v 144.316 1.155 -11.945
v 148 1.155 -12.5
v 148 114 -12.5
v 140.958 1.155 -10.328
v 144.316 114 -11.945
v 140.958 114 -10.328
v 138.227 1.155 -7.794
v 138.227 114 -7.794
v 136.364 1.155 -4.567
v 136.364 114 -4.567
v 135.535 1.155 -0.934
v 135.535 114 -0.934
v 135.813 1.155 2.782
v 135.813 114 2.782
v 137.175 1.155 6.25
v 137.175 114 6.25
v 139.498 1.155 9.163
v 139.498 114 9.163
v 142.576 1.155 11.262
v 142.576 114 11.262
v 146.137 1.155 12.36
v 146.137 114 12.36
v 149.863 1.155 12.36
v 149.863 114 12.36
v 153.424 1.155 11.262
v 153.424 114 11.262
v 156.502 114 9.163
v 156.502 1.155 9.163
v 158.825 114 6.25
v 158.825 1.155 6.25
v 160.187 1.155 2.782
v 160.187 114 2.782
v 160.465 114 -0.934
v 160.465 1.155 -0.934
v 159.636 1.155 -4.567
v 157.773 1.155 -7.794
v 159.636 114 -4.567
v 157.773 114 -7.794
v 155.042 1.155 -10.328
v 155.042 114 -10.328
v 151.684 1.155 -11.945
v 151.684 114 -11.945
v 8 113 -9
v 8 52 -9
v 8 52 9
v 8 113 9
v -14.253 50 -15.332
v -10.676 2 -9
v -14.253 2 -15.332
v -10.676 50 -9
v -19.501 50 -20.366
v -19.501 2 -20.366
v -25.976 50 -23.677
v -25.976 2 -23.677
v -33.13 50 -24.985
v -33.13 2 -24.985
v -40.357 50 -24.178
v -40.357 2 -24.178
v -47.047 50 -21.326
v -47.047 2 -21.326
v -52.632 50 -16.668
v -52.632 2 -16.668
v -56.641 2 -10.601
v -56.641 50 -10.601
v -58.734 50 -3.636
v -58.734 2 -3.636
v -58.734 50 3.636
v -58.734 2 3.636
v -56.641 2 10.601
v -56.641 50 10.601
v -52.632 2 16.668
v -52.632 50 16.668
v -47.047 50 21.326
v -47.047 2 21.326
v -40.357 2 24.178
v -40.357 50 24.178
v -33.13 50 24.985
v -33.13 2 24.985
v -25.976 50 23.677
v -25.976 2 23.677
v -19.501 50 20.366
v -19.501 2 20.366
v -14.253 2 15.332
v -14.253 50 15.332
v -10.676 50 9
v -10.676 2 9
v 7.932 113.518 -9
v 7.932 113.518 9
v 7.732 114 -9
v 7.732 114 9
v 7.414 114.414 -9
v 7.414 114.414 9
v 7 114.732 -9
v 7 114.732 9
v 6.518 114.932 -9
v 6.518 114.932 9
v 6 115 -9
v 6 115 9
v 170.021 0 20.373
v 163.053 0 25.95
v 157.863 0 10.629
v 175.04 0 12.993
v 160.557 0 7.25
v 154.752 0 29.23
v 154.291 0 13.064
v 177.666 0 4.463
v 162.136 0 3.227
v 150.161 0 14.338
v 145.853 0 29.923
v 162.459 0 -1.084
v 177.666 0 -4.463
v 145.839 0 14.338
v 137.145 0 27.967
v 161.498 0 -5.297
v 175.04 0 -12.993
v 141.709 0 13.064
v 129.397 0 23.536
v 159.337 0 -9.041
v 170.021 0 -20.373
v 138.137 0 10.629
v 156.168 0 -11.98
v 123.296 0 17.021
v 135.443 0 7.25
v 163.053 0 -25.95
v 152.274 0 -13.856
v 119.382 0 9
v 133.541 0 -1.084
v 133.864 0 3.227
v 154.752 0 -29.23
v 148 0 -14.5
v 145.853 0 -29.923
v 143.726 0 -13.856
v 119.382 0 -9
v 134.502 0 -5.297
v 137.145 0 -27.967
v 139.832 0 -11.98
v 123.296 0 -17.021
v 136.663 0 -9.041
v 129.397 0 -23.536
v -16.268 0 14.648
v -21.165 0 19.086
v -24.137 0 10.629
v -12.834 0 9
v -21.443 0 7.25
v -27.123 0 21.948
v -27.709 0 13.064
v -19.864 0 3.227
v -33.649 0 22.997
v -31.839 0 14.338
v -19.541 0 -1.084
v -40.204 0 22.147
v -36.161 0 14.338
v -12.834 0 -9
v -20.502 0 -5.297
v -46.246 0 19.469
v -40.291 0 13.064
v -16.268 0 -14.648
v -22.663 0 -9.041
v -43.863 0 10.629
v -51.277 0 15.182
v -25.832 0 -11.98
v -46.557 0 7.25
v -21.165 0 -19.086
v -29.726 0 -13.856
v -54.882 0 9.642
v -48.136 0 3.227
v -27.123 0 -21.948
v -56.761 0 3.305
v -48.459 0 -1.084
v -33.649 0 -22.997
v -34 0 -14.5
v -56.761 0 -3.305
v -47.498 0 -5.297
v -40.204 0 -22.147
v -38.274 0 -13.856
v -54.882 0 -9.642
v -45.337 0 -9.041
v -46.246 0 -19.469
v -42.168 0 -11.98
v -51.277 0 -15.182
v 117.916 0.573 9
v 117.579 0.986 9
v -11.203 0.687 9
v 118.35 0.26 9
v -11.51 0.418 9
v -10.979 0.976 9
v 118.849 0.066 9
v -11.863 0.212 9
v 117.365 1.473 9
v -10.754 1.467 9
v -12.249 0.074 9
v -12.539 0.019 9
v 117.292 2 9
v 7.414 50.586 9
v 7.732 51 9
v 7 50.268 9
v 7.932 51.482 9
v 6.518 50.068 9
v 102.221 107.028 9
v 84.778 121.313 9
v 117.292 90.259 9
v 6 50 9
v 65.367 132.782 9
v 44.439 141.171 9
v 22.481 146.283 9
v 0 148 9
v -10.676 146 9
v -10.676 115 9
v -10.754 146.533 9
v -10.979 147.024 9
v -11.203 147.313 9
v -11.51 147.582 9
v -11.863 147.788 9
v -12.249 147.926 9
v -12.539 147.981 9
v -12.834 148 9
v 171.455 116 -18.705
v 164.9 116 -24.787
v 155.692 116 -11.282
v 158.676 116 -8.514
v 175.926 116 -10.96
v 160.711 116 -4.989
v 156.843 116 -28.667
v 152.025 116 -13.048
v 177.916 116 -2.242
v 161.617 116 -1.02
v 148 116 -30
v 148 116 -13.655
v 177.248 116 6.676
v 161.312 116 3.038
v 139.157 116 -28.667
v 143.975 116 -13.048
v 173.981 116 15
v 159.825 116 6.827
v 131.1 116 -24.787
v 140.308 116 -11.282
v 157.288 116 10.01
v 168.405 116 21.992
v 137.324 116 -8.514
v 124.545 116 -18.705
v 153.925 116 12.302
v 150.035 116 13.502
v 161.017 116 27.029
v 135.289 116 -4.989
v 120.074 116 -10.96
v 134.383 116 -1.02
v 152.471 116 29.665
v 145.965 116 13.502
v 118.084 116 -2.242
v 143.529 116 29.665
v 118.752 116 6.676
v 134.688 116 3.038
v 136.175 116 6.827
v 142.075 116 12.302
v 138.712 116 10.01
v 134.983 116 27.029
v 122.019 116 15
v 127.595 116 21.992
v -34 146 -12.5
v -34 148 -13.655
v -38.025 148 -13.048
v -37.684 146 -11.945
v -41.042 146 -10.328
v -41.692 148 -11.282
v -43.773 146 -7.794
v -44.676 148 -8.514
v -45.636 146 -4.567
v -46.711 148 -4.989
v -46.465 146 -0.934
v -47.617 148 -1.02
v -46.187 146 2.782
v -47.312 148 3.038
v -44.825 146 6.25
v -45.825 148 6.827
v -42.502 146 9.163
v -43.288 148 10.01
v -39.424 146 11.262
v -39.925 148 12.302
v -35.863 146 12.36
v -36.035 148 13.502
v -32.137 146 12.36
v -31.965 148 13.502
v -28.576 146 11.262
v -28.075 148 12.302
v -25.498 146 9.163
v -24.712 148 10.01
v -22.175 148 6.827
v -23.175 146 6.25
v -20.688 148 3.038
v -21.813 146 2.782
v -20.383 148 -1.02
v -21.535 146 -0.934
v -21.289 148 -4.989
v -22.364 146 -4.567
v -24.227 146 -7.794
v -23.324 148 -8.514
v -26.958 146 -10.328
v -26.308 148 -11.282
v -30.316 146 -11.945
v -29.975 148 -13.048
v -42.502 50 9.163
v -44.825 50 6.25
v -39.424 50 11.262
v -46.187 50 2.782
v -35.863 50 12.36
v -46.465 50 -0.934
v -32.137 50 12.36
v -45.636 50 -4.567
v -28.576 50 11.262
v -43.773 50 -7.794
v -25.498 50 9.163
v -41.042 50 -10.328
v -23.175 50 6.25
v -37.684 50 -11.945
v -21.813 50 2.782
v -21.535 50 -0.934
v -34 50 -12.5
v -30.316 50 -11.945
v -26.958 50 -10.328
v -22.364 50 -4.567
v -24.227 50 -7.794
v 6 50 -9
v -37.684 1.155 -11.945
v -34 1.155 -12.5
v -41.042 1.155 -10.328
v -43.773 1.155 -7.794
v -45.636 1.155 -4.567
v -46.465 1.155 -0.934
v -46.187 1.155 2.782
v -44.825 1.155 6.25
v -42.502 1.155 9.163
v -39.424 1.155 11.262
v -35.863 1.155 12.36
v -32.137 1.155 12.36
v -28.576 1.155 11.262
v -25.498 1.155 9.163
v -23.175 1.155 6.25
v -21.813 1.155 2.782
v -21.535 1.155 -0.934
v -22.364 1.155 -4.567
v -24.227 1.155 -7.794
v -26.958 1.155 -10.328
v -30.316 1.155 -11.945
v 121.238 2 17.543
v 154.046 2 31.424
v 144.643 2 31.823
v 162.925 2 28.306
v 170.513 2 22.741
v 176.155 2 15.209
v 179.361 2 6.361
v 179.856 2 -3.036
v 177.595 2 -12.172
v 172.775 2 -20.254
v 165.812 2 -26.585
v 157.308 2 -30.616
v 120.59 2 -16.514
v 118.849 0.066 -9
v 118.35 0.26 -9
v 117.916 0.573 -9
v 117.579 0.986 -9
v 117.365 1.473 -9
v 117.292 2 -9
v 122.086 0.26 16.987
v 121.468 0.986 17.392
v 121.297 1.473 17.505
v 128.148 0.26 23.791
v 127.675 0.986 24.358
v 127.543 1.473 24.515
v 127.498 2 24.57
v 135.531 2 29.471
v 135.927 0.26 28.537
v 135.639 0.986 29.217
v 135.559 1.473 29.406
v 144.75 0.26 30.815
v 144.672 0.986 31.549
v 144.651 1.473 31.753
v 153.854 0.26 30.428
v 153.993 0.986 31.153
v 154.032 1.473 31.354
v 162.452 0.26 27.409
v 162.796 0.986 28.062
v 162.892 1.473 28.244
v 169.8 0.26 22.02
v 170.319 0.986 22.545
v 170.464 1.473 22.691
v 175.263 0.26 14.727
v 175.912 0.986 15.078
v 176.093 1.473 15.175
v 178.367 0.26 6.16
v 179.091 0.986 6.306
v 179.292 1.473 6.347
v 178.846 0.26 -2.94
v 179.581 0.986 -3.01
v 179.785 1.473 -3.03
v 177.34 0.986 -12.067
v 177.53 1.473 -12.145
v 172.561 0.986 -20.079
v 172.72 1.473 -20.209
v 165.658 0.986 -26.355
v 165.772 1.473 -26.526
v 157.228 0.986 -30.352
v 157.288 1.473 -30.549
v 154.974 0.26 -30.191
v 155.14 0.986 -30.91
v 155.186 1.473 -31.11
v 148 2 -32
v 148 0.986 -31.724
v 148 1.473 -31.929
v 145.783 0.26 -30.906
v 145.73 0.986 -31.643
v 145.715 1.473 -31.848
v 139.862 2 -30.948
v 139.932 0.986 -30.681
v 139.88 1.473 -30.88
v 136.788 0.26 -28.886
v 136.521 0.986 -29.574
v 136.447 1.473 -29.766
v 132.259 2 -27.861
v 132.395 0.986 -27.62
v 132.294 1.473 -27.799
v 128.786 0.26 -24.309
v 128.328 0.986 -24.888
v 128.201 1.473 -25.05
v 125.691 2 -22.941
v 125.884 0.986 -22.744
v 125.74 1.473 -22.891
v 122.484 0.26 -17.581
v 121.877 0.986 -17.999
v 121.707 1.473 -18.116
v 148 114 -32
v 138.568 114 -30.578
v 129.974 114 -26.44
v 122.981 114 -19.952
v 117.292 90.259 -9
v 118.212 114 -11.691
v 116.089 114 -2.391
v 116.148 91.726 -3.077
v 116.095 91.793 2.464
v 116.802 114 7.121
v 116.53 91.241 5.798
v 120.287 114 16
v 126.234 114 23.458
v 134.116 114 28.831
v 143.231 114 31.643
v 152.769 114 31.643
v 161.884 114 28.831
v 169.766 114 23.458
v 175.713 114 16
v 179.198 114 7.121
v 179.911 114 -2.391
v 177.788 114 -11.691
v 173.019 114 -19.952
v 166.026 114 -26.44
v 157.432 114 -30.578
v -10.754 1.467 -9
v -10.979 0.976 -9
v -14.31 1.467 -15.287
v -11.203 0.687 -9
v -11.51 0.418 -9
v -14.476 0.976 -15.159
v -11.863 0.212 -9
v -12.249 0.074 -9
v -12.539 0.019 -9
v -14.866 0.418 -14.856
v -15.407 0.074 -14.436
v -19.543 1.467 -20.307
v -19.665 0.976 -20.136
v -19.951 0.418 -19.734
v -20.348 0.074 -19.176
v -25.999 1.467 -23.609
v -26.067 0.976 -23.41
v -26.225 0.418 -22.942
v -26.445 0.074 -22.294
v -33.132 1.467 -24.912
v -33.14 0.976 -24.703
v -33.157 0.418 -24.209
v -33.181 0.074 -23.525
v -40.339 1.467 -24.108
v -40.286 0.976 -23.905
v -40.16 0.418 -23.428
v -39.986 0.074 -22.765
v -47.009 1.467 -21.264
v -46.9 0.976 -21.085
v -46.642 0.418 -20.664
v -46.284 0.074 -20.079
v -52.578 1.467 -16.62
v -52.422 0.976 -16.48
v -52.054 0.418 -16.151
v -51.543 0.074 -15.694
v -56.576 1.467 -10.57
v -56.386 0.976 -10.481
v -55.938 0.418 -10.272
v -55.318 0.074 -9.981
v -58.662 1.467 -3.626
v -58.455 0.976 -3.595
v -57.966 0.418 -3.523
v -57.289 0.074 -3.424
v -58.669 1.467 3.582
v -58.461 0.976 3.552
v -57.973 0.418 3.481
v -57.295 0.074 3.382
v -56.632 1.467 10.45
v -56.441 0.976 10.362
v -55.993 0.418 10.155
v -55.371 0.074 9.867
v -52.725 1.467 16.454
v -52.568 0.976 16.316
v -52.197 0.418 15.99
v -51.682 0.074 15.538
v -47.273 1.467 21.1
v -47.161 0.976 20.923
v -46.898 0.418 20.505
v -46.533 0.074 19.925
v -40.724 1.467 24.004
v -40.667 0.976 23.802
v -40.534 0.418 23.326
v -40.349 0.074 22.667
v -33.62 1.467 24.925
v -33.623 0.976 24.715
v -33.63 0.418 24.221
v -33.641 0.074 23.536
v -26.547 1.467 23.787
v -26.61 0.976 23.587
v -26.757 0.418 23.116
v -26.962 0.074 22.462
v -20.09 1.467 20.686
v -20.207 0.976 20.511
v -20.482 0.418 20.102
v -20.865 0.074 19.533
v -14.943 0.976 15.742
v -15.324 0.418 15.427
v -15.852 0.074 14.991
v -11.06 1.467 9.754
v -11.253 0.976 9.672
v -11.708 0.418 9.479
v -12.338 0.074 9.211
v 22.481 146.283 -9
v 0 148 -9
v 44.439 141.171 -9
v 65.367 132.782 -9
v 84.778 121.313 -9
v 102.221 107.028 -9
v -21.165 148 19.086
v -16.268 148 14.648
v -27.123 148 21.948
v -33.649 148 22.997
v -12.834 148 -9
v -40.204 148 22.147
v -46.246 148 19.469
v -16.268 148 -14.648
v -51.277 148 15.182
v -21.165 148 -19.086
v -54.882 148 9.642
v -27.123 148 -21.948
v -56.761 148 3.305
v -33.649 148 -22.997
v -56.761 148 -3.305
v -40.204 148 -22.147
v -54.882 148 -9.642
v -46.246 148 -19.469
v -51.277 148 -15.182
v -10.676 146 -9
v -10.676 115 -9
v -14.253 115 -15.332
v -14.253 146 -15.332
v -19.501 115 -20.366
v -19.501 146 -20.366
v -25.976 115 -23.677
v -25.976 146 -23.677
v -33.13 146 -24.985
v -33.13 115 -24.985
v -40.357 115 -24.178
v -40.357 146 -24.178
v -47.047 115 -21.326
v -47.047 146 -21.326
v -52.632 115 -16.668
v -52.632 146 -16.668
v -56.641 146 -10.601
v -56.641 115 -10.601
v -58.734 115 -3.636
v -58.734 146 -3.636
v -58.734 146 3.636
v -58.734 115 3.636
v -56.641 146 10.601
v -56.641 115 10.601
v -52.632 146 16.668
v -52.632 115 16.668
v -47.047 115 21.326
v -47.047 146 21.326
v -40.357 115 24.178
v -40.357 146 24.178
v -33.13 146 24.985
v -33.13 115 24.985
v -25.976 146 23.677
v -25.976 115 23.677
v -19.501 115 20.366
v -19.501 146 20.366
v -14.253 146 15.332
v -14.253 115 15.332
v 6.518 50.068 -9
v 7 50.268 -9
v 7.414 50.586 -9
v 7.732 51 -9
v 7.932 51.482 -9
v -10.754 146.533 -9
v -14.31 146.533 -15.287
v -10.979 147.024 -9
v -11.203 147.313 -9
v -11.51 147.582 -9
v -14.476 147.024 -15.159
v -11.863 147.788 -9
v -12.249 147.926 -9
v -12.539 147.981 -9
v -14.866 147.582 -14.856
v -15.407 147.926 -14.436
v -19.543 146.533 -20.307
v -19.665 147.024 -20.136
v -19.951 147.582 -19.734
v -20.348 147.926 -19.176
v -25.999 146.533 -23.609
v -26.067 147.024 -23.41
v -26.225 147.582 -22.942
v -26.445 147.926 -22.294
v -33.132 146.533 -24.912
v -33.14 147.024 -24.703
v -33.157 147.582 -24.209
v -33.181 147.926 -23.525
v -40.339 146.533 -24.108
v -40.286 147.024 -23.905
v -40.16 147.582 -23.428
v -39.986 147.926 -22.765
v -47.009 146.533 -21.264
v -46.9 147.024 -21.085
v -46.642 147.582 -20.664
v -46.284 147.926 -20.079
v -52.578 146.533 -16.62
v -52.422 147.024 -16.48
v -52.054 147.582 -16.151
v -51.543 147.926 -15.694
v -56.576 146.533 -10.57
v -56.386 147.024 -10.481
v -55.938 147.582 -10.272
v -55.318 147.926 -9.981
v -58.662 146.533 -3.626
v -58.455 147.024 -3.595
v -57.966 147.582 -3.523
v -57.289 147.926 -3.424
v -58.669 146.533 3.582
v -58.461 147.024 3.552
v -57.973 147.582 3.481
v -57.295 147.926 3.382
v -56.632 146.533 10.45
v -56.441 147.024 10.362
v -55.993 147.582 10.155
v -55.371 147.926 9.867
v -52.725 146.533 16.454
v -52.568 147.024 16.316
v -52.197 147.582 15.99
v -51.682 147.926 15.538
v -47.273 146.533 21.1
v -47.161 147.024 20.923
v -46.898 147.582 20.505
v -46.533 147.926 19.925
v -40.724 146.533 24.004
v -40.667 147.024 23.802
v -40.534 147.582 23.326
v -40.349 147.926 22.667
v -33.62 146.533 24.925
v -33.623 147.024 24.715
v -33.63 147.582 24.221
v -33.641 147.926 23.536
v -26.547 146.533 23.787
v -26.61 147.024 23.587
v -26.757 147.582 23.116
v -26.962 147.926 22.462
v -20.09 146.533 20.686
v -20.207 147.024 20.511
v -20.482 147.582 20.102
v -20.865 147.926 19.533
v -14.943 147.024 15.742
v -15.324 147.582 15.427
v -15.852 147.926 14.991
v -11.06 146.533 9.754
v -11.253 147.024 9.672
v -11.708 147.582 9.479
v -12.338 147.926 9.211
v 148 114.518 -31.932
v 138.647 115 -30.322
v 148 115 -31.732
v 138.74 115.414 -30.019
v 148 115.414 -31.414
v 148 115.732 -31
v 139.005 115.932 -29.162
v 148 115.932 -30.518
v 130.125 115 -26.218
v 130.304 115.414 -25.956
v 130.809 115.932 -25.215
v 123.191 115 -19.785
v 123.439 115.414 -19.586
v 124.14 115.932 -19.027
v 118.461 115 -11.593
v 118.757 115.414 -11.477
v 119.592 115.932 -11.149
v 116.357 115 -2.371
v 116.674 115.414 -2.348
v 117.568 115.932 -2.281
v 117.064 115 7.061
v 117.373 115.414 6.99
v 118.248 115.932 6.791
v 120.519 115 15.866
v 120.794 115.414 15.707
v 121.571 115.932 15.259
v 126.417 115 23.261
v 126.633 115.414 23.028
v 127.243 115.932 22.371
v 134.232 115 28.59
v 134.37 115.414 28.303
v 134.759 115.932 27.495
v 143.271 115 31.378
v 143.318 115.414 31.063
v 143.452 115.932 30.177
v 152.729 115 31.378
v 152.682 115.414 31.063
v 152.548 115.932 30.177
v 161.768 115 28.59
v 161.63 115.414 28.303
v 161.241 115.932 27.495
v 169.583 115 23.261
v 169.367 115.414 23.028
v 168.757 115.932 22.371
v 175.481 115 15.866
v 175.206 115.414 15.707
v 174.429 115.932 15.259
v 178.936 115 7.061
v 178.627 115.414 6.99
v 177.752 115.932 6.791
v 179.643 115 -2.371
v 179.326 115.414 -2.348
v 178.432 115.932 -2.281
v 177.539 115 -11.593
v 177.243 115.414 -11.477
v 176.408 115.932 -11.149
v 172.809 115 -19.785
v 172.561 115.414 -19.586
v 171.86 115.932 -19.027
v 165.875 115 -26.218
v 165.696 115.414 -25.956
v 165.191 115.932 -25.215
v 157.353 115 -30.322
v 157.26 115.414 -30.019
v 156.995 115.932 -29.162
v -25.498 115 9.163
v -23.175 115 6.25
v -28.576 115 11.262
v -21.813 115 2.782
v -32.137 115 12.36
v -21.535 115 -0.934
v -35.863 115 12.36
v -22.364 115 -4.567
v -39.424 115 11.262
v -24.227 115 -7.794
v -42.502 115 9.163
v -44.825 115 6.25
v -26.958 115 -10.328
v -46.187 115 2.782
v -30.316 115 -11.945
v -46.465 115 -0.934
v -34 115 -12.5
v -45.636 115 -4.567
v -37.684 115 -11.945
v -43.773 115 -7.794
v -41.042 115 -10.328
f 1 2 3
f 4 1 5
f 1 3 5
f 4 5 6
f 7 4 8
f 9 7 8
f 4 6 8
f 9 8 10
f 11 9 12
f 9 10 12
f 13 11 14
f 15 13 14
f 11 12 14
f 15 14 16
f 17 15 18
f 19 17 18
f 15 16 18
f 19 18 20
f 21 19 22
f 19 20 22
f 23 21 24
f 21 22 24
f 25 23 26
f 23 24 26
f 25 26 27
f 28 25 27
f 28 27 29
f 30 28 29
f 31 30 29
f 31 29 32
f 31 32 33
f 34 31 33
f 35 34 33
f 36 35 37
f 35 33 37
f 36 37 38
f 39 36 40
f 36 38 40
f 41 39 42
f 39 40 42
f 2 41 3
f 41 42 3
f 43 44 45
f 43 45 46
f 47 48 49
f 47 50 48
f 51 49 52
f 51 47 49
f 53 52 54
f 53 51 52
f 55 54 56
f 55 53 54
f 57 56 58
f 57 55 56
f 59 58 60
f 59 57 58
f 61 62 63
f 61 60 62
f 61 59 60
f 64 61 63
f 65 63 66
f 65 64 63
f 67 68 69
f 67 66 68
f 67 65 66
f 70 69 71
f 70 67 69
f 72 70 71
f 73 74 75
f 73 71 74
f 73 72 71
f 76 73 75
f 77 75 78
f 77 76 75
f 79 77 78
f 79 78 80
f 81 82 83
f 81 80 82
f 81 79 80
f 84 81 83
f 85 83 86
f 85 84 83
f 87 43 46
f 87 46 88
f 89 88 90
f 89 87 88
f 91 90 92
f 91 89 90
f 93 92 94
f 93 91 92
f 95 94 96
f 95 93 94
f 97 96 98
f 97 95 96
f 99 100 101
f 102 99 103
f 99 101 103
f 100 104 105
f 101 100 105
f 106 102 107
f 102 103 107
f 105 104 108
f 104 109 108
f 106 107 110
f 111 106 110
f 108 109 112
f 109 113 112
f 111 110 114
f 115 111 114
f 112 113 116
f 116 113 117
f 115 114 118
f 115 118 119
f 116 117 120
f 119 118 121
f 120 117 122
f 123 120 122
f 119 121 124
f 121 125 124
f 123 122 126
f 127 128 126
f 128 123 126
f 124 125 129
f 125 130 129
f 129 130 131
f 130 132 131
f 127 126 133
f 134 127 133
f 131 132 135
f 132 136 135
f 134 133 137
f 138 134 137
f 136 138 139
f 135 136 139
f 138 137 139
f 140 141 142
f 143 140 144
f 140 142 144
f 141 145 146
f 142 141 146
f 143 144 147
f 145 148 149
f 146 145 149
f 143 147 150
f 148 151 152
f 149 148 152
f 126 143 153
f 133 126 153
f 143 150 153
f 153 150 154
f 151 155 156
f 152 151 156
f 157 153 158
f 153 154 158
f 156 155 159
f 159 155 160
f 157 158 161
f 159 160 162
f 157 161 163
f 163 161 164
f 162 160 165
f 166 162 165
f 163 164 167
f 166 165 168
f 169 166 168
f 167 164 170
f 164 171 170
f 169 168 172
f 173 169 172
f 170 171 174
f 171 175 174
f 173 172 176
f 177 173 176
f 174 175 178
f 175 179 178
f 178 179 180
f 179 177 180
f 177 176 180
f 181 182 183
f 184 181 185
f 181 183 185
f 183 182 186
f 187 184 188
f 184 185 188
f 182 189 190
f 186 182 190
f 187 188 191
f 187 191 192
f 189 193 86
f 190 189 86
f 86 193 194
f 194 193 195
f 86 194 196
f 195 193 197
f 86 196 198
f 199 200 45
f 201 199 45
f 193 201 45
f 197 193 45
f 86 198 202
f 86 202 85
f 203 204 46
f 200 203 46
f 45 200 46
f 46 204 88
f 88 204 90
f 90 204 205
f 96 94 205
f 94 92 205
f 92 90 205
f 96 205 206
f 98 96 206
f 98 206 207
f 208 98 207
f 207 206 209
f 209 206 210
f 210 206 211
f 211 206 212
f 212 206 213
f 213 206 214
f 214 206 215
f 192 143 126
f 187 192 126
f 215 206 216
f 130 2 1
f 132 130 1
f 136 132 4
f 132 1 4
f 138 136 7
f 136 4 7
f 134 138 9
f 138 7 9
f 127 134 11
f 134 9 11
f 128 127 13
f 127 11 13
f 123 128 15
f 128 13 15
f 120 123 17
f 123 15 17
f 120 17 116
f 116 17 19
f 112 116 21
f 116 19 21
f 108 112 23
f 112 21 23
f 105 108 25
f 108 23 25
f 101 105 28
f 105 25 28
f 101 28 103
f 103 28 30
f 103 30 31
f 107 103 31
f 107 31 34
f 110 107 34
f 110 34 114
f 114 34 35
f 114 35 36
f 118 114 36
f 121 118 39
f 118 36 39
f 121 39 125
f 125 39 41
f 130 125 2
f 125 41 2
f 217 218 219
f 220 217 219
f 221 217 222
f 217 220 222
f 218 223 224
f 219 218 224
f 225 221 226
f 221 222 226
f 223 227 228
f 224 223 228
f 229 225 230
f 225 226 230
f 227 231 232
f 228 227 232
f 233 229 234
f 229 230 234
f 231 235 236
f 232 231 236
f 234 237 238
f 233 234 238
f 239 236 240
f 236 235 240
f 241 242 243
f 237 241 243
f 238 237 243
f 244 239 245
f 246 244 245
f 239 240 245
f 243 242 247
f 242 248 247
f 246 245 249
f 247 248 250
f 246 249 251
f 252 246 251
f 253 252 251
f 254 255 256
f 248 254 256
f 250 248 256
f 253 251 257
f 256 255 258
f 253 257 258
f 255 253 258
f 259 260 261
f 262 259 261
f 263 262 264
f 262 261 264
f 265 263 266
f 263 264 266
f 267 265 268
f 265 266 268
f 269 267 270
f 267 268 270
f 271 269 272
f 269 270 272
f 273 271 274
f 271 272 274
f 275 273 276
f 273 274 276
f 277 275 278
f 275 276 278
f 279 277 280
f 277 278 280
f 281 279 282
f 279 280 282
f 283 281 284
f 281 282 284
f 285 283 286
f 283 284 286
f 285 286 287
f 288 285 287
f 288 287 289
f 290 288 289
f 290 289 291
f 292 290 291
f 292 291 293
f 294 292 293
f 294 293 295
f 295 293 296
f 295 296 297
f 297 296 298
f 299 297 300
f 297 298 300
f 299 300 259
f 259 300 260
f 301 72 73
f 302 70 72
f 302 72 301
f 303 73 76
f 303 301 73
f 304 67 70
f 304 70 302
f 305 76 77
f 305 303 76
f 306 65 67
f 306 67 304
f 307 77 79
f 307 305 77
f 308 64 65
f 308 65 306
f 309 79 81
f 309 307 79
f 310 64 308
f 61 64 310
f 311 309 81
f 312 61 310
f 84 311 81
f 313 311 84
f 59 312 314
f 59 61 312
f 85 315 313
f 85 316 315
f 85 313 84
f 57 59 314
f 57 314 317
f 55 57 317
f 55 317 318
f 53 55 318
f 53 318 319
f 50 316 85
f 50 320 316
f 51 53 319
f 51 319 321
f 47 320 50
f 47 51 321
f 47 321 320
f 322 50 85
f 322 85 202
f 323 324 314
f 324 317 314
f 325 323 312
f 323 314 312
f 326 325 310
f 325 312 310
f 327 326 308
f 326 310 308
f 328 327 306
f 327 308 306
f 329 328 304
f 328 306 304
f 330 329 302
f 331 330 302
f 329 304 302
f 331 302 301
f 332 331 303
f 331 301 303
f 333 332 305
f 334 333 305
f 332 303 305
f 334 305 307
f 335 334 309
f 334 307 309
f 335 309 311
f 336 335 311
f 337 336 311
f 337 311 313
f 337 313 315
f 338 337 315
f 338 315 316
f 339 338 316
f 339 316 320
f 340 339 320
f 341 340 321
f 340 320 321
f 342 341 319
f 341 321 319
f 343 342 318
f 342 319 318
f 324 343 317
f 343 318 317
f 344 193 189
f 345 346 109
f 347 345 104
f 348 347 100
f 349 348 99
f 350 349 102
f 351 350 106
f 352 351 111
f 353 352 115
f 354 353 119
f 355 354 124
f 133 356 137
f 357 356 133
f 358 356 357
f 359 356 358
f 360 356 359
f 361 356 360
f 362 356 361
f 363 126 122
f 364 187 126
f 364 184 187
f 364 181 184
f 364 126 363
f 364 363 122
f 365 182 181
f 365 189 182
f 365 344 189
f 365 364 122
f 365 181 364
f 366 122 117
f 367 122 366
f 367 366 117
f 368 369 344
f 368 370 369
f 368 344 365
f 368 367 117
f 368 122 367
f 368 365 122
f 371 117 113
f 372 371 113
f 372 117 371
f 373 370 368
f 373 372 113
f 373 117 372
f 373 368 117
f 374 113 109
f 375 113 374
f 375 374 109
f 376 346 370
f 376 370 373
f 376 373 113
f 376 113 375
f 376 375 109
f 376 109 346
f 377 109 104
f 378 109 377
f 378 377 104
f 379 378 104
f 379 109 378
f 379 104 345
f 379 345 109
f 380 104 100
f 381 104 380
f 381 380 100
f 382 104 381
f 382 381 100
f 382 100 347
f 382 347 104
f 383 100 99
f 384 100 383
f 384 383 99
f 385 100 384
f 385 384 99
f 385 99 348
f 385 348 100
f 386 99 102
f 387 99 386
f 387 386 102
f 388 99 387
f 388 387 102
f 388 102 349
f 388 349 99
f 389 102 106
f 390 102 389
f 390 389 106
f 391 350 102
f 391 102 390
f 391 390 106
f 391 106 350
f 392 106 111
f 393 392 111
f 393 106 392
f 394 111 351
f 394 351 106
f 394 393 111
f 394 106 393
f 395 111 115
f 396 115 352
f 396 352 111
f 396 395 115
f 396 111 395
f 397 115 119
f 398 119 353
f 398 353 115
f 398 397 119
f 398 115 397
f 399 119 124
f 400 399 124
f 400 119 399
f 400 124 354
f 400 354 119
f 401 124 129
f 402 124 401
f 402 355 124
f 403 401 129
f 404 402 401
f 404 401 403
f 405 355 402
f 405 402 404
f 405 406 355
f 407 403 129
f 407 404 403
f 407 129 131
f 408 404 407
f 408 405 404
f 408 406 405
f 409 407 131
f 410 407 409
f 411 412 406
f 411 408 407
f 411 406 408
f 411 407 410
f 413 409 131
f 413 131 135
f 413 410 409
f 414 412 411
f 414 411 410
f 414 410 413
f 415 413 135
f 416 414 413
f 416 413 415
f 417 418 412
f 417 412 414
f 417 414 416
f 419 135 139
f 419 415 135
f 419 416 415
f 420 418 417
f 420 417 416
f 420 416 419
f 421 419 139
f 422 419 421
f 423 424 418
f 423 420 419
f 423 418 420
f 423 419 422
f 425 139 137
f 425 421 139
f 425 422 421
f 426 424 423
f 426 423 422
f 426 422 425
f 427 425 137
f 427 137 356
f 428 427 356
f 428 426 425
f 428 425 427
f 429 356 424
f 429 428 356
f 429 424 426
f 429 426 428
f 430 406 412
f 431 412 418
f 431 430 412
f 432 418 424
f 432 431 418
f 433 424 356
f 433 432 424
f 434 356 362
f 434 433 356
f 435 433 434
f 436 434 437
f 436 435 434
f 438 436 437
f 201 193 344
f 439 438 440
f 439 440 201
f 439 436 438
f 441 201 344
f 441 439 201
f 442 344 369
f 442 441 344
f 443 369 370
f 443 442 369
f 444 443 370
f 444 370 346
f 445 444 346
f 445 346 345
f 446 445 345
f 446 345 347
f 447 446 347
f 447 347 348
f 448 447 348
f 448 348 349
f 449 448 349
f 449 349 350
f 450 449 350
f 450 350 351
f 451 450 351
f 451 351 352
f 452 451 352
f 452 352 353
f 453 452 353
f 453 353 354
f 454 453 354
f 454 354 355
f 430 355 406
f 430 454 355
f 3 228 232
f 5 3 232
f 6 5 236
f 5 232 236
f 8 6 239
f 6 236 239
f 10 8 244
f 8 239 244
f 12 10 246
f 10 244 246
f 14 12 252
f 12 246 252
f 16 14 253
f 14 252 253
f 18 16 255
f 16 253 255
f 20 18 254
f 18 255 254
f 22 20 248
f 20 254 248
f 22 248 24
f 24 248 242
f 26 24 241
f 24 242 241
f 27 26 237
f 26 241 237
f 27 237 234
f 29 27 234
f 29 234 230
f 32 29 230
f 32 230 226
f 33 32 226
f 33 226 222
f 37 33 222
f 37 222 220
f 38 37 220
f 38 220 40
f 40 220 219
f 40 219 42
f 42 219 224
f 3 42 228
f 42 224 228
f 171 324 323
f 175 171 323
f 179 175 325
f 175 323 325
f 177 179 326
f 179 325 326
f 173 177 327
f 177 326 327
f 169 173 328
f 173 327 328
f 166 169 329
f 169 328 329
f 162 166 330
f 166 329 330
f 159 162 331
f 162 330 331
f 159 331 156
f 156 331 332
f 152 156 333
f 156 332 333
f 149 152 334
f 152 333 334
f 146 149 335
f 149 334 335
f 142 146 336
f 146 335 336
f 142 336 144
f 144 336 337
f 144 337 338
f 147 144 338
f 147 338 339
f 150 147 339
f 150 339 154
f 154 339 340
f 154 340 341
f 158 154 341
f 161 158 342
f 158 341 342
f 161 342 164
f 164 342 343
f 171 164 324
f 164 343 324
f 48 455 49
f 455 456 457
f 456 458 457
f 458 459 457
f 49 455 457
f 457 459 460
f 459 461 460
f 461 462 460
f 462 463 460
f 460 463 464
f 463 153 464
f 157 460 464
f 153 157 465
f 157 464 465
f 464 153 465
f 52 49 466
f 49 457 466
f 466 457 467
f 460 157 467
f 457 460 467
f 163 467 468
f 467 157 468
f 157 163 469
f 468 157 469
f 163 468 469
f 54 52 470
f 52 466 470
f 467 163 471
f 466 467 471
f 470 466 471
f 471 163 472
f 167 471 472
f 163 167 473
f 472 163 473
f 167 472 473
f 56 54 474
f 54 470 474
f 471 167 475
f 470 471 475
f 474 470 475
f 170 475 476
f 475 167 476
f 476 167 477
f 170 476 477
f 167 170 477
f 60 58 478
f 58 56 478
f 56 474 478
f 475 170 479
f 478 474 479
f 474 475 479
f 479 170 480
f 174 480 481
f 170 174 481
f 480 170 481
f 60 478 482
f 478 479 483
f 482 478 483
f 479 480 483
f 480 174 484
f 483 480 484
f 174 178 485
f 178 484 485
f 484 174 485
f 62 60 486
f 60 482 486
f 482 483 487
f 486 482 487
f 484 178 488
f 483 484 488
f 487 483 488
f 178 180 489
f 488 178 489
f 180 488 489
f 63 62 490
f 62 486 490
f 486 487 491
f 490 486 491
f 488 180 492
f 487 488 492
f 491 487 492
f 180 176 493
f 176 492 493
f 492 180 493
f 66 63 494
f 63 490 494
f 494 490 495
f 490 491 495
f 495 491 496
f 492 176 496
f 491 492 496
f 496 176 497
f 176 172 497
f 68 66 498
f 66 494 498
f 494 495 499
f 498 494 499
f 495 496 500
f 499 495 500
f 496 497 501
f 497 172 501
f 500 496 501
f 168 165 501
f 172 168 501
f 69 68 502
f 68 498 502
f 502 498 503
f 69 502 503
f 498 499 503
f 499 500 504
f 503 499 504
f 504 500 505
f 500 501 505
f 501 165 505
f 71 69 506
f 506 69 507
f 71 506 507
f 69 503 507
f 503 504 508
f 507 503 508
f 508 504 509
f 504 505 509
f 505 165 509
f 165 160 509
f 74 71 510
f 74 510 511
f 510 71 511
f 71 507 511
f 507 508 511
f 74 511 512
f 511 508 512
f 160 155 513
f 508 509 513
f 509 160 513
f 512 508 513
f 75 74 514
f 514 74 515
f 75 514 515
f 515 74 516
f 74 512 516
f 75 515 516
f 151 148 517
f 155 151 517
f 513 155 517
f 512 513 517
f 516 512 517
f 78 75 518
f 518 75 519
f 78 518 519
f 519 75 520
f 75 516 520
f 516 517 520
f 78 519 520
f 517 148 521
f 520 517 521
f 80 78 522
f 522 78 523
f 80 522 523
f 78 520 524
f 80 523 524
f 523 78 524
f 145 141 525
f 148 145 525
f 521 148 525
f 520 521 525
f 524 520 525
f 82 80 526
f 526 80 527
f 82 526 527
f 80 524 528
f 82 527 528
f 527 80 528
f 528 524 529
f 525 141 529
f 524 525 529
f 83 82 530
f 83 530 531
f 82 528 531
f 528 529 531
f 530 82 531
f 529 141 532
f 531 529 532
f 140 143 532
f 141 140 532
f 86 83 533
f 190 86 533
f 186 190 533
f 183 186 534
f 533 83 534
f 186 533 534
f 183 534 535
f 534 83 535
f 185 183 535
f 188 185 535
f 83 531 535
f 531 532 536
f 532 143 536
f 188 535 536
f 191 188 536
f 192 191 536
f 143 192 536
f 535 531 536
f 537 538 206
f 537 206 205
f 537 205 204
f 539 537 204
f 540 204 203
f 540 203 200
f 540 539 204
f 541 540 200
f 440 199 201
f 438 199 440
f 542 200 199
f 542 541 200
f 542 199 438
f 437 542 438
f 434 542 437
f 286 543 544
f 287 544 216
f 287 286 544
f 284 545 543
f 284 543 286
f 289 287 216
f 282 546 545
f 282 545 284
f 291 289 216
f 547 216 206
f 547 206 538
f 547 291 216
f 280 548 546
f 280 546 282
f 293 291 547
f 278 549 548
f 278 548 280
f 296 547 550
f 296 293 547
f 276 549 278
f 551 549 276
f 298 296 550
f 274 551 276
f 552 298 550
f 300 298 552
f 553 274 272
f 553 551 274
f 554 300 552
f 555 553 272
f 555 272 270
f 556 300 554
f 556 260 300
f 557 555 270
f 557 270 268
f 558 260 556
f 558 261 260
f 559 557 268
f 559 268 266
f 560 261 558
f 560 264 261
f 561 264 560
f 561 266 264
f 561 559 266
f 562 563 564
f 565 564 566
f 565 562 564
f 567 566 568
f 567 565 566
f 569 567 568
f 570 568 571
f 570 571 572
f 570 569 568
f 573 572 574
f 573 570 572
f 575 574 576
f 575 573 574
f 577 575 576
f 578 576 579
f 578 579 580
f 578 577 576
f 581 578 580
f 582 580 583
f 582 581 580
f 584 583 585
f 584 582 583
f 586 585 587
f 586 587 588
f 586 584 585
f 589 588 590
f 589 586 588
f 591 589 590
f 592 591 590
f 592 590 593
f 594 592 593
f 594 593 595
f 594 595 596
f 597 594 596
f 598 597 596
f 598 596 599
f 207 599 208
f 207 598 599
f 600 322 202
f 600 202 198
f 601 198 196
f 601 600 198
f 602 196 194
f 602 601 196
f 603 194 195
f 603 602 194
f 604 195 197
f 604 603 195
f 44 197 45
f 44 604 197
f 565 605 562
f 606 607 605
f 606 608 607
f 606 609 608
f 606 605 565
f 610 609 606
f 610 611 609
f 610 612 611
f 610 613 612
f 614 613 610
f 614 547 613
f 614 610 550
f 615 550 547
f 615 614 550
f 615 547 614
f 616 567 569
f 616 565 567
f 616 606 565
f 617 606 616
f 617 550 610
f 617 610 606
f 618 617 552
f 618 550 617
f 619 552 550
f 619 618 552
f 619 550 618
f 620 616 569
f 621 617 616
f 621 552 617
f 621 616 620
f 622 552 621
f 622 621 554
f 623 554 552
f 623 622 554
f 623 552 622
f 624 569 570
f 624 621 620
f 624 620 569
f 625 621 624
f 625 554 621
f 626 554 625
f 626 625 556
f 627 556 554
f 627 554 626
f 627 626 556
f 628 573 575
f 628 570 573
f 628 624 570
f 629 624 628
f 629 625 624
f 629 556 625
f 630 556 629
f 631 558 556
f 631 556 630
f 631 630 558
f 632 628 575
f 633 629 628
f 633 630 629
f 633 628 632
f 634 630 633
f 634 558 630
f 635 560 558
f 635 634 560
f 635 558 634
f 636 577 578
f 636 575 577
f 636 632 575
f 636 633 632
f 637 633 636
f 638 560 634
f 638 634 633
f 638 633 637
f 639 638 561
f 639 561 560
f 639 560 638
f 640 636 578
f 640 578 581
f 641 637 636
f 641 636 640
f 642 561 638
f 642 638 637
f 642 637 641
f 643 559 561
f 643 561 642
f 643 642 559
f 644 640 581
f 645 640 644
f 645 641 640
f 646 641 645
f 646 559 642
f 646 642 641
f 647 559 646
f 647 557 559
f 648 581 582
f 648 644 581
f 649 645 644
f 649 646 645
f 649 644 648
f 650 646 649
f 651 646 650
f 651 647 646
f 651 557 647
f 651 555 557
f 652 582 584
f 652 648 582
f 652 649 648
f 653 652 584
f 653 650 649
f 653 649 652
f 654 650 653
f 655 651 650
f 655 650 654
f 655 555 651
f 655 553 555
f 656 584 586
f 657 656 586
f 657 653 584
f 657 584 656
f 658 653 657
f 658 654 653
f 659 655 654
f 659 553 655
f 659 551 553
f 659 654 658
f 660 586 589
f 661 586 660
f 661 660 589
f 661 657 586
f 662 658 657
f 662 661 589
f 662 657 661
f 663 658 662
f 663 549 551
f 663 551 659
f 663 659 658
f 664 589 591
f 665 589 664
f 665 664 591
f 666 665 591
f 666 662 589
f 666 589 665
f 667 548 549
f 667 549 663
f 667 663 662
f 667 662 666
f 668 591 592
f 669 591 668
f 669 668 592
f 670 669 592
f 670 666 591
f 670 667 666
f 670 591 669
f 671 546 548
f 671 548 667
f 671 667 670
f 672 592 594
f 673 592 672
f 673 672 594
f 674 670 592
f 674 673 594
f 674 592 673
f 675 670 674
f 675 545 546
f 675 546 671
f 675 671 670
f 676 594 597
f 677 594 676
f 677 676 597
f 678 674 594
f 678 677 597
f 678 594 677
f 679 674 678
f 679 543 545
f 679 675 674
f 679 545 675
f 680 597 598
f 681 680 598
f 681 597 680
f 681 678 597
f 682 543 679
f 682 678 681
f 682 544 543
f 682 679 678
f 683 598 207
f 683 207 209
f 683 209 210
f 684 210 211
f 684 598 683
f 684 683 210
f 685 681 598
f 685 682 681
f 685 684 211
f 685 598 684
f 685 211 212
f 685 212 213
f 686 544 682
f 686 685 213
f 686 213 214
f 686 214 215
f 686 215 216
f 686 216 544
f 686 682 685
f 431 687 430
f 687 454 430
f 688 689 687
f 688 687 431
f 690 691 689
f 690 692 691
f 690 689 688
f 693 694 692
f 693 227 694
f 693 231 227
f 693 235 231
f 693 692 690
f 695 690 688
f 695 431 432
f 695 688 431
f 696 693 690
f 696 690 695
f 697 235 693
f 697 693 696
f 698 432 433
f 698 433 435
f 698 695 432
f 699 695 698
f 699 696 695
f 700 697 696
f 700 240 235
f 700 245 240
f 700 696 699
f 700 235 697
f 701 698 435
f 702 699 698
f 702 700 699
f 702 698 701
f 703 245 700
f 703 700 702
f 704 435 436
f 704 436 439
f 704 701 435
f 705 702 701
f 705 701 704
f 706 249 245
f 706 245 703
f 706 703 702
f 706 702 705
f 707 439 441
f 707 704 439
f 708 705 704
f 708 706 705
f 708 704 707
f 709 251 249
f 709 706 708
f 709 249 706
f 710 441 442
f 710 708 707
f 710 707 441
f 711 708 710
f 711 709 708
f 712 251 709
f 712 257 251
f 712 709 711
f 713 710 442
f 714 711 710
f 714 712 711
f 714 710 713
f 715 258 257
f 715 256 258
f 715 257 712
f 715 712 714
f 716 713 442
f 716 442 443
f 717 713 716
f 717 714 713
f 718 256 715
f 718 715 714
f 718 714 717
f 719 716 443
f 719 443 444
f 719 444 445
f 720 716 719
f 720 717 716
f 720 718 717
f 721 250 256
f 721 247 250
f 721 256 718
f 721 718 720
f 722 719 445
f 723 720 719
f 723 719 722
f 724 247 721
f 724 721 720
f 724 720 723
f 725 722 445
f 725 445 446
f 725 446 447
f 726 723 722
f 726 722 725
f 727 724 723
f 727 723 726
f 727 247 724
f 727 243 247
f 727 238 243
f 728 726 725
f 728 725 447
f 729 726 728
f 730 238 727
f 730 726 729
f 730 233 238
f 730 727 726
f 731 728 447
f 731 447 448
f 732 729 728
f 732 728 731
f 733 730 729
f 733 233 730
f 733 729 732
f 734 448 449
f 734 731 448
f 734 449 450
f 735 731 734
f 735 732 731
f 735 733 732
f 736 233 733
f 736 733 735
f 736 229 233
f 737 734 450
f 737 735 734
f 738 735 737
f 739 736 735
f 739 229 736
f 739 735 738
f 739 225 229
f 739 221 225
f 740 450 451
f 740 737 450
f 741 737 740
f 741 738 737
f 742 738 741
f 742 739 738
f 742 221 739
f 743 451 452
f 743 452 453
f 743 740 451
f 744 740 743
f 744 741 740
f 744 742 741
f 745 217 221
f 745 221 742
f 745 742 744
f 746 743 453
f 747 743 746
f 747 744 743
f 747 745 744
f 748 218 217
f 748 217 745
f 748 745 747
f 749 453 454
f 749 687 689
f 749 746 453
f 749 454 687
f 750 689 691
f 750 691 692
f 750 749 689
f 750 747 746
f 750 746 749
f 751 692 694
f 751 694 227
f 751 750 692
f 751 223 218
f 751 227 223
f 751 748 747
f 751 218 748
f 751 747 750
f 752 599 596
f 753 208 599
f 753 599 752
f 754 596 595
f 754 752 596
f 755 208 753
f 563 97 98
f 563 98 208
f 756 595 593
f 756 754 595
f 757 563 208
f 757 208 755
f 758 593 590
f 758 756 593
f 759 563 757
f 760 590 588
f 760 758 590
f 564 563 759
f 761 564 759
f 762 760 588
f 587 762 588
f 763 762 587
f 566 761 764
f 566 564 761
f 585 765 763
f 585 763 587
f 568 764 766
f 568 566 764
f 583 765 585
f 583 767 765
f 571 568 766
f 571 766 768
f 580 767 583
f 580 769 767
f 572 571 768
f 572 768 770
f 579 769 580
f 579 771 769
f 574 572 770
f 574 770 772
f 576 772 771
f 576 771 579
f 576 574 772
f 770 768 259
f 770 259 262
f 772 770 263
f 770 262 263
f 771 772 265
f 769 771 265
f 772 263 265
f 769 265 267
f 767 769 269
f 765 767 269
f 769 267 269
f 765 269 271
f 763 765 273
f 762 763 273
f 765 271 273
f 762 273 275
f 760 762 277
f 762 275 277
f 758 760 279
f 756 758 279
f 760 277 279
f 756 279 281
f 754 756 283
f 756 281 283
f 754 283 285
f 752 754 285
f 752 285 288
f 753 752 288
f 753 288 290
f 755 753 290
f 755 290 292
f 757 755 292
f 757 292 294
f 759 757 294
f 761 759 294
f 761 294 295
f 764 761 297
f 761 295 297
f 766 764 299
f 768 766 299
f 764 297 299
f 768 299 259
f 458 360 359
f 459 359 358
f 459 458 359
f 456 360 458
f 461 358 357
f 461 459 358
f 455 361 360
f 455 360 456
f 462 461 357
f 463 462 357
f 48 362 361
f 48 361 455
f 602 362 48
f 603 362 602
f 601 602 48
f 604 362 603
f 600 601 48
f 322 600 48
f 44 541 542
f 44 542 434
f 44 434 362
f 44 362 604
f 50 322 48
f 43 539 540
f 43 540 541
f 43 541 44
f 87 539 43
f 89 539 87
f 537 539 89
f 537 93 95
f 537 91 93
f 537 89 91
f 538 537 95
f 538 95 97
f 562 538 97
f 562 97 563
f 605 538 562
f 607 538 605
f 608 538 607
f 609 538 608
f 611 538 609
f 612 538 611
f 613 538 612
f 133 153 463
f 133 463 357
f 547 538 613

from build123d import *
from OCP.BRepFilletAPI import BRepFilletAPI_MakeChamfer

# Parameters (mm, degrees)
SKETCH1_W                = 19.5
SKETCH1_H                = 116
SKETCH3_W                = 12.5
SKETCH3_H                = 148
CHAMFER2_SIZE            = 2
CHAMFER2_SIZE2           = 1.154700538
FILLET1_R                = 2
FILLET2_R                = 2
FILLET3_R                = 2
BOSS_EXTRUDE1_DEPTH      = 9
BOSS_EXTRUDE1_DEPTH_BACK = 9
CHAMFER1_SIZE            = 2
CHAMFER1_SIZE2           = 1.154700538
CUT_EXTRUDE9_DEPTH       = 236.219047001
CUT_EXTRUDE9_DEPTH_BACK  = 236.219047001


with BuildPart() as part:
    # Sketch1 → Revolve2 (revolve)
    with BuildSketch(Plane.XY):
        with Locations((170.25, 58)):
            Rectangle(SKETCH1_W, SKETCH1_H)
    revolve(axis=Axis((148, 0, 0), (0, 1, 0)))

    # Chamfer2: one chamfer whose edges measure the first distance from different faces: ONE call of the kernel's chamfer builder (chamfer() names one face for all edges)
    chamfer2_edges_1 = [part.edges().sort_by_distance(p)[0] for p in [
        (135.5, 116, 0),
    ]]
    chamfer2_side_1 = [part.faces().sort_by_distance(p)[0] for p in [
        (135.5, 58, 0),
    ]]
    chamfer2_edges_2 = [part.edges().sort_by_distance(p)[0] for p in [
        (135.5, 0, 0),
    ]]
    chamfer2_side_2 = [part.faces().sort_by_distance(p)[0] for p in [
        (116.90509668, 0, 0),
    ]]
    chamfer2 = BRepFilletAPI_MakeChamfer(part.part.solid().wrapped)
    for e in chamfer2_edges_1:
        chamfer2.Add(CHAMFER2_SIZE, CHAMFER2_SIZE2, e.wrapped, chamfer2_side_1[0].wrapped)  # the first distance lies on this face
    for e in chamfer2_edges_2:
        chamfer2.Add(CHAMFER2_SIZE, CHAMFER2_SIZE2, e.wrapped, chamfer2_side_2[0].wrapped)  # the first distance lies on this face
    add(Compound.cast(chamfer2.Shape()), mode=Mode.REPLACE)

    # Fillet2
    fillet2_edges = [part.edges().sort_by_distance(p)[0] for p in [
        (116, 0, 0),
    ]]
    fillet(fillet2_edges, radius=FILLET2_R)

    # Fillet3
    fillet3_edges = [part.edges().sort_by_distance(p)[0] for p in [
        (116, 116, 0),
    ]]
    fillet(fillet3_edges, radius=FILLET3_R)



with BuildPart() as body_2:
    # Sketch3 → Revolve3 (revolve)
    with BuildSketch(Plane.XY):
        with Locations((-52.75, 74)):
            Rectangle(SKETCH3_W, SKETCH3_H)
    revolve(axis=Axis((-34, 0, 0), (0, 1, 0)))

    # Fillet1
    fillet1_edges = [body_2.edges().sort_by_distance(p)[0] for p in [
        (-9, 148, 0),
        (-9, 0, 0),
    ]]
    fillet(fillet1_edges, radius=FILLET1_R)


with BuildPart() as part_1:
    add(part.part)

    add(body_2.part)  # Boss-Extrude1 merges body 2
    # Sketch4 → Boss-Extrude1 (add, two sides: drawn at the far end of the back side and taken through both)
    with BuildSketch(Plane.XY.offset(-BOSS_EXTRUDE1_DEPTH_BACK)):
        with BuildLine():
            Line((0, 0), (-15.091814832, 0))
            Line((-15.091814832, 0), (-15.091814832, 148))
            Line((-15.091814832, 148), (0, 148))
            ThreePointArc((0, 148), (71.793516775, 129.420597082), (125.561619022, 78.347174987))
            Line((125.561619022, 78.347174987), (125.561619022, 0))
            Line((125.561619022, 0), (0, 0))
        make_face()
    extrude(amount=BOSS_EXTRUDE1_DEPTH + BOSS_EXTRUDE1_DEPTH_BACK)

    # Chamfer1: one chamfer whose edges measure the first distance from different faces: ONE call of the kernel's chamfer builder (chamfer() names one face for all edges)
    chamfer1_edges_1 = [part_1.edges().sort_by_distance(p)[0] for p in [
        (-21.5, 0, 0),
    ]]
    chamfer1_side_1 = [part_1.faces().sort_by_distance(p)[0] for p in [
        (71.485193213, 0, 0),
    ]]
    chamfer1_edges_2 = [part_1.edges().sort_by_distance(p)[0] for p in [
        (-21.5, 148, 0),
    ]]
    chamfer1_side_2 = [part_1.faces().sort_by_distance(p)[0] for p in [
        (-21.5, 74, 0),
    ]]
    chamfer1 = BRepFilletAPI_MakeChamfer(part_1.part.solid().wrapped)
    for e in chamfer1_edges_1:
        chamfer1.Add(CHAMFER1_SIZE, CHAMFER1_SIZE2, e.wrapped, chamfer1_side_1[0].wrapped)  # the first distance lies on this face
    for e in chamfer1_edges_2:
        chamfer1.Add(CHAMFER1_SIZE, CHAMFER1_SIZE2, e.wrapped, chamfer1_side_2[0].wrapped)  # the first distance lies on this face
    add(Compound.cast(chamfer1.Shape()), mode=Mode.REPLACE)

    # Sketch23 → Cut-Extrude9 (cut, two sides: drawn at the far end of the back side and taken through both)
    with BuildSketch(Plane.XY.offset(-CUT_EXTRUDE9_DEPTH_BACK)):
        with BuildLine():
            Line((-59, 50), (6, 50))
            ThreePointArc((6, 50), (7.414213562, 50.585786438), (8, 52))
            Line((8, 52), (8, 113))
            ThreePointArc((8, 113), (7.414213562, 114.414213562), (6, 115))
            Line((6, 115), (-59, 115))
            Line((-59, 115), (-59, 50))
        make_face()
    extrude(amount=CUT_EXTRUDE9_DEPTH + CUT_EXTRUDE9_DEPTH_BACK, mode=Mode.SUBTRACT)


solid = part_1.part
